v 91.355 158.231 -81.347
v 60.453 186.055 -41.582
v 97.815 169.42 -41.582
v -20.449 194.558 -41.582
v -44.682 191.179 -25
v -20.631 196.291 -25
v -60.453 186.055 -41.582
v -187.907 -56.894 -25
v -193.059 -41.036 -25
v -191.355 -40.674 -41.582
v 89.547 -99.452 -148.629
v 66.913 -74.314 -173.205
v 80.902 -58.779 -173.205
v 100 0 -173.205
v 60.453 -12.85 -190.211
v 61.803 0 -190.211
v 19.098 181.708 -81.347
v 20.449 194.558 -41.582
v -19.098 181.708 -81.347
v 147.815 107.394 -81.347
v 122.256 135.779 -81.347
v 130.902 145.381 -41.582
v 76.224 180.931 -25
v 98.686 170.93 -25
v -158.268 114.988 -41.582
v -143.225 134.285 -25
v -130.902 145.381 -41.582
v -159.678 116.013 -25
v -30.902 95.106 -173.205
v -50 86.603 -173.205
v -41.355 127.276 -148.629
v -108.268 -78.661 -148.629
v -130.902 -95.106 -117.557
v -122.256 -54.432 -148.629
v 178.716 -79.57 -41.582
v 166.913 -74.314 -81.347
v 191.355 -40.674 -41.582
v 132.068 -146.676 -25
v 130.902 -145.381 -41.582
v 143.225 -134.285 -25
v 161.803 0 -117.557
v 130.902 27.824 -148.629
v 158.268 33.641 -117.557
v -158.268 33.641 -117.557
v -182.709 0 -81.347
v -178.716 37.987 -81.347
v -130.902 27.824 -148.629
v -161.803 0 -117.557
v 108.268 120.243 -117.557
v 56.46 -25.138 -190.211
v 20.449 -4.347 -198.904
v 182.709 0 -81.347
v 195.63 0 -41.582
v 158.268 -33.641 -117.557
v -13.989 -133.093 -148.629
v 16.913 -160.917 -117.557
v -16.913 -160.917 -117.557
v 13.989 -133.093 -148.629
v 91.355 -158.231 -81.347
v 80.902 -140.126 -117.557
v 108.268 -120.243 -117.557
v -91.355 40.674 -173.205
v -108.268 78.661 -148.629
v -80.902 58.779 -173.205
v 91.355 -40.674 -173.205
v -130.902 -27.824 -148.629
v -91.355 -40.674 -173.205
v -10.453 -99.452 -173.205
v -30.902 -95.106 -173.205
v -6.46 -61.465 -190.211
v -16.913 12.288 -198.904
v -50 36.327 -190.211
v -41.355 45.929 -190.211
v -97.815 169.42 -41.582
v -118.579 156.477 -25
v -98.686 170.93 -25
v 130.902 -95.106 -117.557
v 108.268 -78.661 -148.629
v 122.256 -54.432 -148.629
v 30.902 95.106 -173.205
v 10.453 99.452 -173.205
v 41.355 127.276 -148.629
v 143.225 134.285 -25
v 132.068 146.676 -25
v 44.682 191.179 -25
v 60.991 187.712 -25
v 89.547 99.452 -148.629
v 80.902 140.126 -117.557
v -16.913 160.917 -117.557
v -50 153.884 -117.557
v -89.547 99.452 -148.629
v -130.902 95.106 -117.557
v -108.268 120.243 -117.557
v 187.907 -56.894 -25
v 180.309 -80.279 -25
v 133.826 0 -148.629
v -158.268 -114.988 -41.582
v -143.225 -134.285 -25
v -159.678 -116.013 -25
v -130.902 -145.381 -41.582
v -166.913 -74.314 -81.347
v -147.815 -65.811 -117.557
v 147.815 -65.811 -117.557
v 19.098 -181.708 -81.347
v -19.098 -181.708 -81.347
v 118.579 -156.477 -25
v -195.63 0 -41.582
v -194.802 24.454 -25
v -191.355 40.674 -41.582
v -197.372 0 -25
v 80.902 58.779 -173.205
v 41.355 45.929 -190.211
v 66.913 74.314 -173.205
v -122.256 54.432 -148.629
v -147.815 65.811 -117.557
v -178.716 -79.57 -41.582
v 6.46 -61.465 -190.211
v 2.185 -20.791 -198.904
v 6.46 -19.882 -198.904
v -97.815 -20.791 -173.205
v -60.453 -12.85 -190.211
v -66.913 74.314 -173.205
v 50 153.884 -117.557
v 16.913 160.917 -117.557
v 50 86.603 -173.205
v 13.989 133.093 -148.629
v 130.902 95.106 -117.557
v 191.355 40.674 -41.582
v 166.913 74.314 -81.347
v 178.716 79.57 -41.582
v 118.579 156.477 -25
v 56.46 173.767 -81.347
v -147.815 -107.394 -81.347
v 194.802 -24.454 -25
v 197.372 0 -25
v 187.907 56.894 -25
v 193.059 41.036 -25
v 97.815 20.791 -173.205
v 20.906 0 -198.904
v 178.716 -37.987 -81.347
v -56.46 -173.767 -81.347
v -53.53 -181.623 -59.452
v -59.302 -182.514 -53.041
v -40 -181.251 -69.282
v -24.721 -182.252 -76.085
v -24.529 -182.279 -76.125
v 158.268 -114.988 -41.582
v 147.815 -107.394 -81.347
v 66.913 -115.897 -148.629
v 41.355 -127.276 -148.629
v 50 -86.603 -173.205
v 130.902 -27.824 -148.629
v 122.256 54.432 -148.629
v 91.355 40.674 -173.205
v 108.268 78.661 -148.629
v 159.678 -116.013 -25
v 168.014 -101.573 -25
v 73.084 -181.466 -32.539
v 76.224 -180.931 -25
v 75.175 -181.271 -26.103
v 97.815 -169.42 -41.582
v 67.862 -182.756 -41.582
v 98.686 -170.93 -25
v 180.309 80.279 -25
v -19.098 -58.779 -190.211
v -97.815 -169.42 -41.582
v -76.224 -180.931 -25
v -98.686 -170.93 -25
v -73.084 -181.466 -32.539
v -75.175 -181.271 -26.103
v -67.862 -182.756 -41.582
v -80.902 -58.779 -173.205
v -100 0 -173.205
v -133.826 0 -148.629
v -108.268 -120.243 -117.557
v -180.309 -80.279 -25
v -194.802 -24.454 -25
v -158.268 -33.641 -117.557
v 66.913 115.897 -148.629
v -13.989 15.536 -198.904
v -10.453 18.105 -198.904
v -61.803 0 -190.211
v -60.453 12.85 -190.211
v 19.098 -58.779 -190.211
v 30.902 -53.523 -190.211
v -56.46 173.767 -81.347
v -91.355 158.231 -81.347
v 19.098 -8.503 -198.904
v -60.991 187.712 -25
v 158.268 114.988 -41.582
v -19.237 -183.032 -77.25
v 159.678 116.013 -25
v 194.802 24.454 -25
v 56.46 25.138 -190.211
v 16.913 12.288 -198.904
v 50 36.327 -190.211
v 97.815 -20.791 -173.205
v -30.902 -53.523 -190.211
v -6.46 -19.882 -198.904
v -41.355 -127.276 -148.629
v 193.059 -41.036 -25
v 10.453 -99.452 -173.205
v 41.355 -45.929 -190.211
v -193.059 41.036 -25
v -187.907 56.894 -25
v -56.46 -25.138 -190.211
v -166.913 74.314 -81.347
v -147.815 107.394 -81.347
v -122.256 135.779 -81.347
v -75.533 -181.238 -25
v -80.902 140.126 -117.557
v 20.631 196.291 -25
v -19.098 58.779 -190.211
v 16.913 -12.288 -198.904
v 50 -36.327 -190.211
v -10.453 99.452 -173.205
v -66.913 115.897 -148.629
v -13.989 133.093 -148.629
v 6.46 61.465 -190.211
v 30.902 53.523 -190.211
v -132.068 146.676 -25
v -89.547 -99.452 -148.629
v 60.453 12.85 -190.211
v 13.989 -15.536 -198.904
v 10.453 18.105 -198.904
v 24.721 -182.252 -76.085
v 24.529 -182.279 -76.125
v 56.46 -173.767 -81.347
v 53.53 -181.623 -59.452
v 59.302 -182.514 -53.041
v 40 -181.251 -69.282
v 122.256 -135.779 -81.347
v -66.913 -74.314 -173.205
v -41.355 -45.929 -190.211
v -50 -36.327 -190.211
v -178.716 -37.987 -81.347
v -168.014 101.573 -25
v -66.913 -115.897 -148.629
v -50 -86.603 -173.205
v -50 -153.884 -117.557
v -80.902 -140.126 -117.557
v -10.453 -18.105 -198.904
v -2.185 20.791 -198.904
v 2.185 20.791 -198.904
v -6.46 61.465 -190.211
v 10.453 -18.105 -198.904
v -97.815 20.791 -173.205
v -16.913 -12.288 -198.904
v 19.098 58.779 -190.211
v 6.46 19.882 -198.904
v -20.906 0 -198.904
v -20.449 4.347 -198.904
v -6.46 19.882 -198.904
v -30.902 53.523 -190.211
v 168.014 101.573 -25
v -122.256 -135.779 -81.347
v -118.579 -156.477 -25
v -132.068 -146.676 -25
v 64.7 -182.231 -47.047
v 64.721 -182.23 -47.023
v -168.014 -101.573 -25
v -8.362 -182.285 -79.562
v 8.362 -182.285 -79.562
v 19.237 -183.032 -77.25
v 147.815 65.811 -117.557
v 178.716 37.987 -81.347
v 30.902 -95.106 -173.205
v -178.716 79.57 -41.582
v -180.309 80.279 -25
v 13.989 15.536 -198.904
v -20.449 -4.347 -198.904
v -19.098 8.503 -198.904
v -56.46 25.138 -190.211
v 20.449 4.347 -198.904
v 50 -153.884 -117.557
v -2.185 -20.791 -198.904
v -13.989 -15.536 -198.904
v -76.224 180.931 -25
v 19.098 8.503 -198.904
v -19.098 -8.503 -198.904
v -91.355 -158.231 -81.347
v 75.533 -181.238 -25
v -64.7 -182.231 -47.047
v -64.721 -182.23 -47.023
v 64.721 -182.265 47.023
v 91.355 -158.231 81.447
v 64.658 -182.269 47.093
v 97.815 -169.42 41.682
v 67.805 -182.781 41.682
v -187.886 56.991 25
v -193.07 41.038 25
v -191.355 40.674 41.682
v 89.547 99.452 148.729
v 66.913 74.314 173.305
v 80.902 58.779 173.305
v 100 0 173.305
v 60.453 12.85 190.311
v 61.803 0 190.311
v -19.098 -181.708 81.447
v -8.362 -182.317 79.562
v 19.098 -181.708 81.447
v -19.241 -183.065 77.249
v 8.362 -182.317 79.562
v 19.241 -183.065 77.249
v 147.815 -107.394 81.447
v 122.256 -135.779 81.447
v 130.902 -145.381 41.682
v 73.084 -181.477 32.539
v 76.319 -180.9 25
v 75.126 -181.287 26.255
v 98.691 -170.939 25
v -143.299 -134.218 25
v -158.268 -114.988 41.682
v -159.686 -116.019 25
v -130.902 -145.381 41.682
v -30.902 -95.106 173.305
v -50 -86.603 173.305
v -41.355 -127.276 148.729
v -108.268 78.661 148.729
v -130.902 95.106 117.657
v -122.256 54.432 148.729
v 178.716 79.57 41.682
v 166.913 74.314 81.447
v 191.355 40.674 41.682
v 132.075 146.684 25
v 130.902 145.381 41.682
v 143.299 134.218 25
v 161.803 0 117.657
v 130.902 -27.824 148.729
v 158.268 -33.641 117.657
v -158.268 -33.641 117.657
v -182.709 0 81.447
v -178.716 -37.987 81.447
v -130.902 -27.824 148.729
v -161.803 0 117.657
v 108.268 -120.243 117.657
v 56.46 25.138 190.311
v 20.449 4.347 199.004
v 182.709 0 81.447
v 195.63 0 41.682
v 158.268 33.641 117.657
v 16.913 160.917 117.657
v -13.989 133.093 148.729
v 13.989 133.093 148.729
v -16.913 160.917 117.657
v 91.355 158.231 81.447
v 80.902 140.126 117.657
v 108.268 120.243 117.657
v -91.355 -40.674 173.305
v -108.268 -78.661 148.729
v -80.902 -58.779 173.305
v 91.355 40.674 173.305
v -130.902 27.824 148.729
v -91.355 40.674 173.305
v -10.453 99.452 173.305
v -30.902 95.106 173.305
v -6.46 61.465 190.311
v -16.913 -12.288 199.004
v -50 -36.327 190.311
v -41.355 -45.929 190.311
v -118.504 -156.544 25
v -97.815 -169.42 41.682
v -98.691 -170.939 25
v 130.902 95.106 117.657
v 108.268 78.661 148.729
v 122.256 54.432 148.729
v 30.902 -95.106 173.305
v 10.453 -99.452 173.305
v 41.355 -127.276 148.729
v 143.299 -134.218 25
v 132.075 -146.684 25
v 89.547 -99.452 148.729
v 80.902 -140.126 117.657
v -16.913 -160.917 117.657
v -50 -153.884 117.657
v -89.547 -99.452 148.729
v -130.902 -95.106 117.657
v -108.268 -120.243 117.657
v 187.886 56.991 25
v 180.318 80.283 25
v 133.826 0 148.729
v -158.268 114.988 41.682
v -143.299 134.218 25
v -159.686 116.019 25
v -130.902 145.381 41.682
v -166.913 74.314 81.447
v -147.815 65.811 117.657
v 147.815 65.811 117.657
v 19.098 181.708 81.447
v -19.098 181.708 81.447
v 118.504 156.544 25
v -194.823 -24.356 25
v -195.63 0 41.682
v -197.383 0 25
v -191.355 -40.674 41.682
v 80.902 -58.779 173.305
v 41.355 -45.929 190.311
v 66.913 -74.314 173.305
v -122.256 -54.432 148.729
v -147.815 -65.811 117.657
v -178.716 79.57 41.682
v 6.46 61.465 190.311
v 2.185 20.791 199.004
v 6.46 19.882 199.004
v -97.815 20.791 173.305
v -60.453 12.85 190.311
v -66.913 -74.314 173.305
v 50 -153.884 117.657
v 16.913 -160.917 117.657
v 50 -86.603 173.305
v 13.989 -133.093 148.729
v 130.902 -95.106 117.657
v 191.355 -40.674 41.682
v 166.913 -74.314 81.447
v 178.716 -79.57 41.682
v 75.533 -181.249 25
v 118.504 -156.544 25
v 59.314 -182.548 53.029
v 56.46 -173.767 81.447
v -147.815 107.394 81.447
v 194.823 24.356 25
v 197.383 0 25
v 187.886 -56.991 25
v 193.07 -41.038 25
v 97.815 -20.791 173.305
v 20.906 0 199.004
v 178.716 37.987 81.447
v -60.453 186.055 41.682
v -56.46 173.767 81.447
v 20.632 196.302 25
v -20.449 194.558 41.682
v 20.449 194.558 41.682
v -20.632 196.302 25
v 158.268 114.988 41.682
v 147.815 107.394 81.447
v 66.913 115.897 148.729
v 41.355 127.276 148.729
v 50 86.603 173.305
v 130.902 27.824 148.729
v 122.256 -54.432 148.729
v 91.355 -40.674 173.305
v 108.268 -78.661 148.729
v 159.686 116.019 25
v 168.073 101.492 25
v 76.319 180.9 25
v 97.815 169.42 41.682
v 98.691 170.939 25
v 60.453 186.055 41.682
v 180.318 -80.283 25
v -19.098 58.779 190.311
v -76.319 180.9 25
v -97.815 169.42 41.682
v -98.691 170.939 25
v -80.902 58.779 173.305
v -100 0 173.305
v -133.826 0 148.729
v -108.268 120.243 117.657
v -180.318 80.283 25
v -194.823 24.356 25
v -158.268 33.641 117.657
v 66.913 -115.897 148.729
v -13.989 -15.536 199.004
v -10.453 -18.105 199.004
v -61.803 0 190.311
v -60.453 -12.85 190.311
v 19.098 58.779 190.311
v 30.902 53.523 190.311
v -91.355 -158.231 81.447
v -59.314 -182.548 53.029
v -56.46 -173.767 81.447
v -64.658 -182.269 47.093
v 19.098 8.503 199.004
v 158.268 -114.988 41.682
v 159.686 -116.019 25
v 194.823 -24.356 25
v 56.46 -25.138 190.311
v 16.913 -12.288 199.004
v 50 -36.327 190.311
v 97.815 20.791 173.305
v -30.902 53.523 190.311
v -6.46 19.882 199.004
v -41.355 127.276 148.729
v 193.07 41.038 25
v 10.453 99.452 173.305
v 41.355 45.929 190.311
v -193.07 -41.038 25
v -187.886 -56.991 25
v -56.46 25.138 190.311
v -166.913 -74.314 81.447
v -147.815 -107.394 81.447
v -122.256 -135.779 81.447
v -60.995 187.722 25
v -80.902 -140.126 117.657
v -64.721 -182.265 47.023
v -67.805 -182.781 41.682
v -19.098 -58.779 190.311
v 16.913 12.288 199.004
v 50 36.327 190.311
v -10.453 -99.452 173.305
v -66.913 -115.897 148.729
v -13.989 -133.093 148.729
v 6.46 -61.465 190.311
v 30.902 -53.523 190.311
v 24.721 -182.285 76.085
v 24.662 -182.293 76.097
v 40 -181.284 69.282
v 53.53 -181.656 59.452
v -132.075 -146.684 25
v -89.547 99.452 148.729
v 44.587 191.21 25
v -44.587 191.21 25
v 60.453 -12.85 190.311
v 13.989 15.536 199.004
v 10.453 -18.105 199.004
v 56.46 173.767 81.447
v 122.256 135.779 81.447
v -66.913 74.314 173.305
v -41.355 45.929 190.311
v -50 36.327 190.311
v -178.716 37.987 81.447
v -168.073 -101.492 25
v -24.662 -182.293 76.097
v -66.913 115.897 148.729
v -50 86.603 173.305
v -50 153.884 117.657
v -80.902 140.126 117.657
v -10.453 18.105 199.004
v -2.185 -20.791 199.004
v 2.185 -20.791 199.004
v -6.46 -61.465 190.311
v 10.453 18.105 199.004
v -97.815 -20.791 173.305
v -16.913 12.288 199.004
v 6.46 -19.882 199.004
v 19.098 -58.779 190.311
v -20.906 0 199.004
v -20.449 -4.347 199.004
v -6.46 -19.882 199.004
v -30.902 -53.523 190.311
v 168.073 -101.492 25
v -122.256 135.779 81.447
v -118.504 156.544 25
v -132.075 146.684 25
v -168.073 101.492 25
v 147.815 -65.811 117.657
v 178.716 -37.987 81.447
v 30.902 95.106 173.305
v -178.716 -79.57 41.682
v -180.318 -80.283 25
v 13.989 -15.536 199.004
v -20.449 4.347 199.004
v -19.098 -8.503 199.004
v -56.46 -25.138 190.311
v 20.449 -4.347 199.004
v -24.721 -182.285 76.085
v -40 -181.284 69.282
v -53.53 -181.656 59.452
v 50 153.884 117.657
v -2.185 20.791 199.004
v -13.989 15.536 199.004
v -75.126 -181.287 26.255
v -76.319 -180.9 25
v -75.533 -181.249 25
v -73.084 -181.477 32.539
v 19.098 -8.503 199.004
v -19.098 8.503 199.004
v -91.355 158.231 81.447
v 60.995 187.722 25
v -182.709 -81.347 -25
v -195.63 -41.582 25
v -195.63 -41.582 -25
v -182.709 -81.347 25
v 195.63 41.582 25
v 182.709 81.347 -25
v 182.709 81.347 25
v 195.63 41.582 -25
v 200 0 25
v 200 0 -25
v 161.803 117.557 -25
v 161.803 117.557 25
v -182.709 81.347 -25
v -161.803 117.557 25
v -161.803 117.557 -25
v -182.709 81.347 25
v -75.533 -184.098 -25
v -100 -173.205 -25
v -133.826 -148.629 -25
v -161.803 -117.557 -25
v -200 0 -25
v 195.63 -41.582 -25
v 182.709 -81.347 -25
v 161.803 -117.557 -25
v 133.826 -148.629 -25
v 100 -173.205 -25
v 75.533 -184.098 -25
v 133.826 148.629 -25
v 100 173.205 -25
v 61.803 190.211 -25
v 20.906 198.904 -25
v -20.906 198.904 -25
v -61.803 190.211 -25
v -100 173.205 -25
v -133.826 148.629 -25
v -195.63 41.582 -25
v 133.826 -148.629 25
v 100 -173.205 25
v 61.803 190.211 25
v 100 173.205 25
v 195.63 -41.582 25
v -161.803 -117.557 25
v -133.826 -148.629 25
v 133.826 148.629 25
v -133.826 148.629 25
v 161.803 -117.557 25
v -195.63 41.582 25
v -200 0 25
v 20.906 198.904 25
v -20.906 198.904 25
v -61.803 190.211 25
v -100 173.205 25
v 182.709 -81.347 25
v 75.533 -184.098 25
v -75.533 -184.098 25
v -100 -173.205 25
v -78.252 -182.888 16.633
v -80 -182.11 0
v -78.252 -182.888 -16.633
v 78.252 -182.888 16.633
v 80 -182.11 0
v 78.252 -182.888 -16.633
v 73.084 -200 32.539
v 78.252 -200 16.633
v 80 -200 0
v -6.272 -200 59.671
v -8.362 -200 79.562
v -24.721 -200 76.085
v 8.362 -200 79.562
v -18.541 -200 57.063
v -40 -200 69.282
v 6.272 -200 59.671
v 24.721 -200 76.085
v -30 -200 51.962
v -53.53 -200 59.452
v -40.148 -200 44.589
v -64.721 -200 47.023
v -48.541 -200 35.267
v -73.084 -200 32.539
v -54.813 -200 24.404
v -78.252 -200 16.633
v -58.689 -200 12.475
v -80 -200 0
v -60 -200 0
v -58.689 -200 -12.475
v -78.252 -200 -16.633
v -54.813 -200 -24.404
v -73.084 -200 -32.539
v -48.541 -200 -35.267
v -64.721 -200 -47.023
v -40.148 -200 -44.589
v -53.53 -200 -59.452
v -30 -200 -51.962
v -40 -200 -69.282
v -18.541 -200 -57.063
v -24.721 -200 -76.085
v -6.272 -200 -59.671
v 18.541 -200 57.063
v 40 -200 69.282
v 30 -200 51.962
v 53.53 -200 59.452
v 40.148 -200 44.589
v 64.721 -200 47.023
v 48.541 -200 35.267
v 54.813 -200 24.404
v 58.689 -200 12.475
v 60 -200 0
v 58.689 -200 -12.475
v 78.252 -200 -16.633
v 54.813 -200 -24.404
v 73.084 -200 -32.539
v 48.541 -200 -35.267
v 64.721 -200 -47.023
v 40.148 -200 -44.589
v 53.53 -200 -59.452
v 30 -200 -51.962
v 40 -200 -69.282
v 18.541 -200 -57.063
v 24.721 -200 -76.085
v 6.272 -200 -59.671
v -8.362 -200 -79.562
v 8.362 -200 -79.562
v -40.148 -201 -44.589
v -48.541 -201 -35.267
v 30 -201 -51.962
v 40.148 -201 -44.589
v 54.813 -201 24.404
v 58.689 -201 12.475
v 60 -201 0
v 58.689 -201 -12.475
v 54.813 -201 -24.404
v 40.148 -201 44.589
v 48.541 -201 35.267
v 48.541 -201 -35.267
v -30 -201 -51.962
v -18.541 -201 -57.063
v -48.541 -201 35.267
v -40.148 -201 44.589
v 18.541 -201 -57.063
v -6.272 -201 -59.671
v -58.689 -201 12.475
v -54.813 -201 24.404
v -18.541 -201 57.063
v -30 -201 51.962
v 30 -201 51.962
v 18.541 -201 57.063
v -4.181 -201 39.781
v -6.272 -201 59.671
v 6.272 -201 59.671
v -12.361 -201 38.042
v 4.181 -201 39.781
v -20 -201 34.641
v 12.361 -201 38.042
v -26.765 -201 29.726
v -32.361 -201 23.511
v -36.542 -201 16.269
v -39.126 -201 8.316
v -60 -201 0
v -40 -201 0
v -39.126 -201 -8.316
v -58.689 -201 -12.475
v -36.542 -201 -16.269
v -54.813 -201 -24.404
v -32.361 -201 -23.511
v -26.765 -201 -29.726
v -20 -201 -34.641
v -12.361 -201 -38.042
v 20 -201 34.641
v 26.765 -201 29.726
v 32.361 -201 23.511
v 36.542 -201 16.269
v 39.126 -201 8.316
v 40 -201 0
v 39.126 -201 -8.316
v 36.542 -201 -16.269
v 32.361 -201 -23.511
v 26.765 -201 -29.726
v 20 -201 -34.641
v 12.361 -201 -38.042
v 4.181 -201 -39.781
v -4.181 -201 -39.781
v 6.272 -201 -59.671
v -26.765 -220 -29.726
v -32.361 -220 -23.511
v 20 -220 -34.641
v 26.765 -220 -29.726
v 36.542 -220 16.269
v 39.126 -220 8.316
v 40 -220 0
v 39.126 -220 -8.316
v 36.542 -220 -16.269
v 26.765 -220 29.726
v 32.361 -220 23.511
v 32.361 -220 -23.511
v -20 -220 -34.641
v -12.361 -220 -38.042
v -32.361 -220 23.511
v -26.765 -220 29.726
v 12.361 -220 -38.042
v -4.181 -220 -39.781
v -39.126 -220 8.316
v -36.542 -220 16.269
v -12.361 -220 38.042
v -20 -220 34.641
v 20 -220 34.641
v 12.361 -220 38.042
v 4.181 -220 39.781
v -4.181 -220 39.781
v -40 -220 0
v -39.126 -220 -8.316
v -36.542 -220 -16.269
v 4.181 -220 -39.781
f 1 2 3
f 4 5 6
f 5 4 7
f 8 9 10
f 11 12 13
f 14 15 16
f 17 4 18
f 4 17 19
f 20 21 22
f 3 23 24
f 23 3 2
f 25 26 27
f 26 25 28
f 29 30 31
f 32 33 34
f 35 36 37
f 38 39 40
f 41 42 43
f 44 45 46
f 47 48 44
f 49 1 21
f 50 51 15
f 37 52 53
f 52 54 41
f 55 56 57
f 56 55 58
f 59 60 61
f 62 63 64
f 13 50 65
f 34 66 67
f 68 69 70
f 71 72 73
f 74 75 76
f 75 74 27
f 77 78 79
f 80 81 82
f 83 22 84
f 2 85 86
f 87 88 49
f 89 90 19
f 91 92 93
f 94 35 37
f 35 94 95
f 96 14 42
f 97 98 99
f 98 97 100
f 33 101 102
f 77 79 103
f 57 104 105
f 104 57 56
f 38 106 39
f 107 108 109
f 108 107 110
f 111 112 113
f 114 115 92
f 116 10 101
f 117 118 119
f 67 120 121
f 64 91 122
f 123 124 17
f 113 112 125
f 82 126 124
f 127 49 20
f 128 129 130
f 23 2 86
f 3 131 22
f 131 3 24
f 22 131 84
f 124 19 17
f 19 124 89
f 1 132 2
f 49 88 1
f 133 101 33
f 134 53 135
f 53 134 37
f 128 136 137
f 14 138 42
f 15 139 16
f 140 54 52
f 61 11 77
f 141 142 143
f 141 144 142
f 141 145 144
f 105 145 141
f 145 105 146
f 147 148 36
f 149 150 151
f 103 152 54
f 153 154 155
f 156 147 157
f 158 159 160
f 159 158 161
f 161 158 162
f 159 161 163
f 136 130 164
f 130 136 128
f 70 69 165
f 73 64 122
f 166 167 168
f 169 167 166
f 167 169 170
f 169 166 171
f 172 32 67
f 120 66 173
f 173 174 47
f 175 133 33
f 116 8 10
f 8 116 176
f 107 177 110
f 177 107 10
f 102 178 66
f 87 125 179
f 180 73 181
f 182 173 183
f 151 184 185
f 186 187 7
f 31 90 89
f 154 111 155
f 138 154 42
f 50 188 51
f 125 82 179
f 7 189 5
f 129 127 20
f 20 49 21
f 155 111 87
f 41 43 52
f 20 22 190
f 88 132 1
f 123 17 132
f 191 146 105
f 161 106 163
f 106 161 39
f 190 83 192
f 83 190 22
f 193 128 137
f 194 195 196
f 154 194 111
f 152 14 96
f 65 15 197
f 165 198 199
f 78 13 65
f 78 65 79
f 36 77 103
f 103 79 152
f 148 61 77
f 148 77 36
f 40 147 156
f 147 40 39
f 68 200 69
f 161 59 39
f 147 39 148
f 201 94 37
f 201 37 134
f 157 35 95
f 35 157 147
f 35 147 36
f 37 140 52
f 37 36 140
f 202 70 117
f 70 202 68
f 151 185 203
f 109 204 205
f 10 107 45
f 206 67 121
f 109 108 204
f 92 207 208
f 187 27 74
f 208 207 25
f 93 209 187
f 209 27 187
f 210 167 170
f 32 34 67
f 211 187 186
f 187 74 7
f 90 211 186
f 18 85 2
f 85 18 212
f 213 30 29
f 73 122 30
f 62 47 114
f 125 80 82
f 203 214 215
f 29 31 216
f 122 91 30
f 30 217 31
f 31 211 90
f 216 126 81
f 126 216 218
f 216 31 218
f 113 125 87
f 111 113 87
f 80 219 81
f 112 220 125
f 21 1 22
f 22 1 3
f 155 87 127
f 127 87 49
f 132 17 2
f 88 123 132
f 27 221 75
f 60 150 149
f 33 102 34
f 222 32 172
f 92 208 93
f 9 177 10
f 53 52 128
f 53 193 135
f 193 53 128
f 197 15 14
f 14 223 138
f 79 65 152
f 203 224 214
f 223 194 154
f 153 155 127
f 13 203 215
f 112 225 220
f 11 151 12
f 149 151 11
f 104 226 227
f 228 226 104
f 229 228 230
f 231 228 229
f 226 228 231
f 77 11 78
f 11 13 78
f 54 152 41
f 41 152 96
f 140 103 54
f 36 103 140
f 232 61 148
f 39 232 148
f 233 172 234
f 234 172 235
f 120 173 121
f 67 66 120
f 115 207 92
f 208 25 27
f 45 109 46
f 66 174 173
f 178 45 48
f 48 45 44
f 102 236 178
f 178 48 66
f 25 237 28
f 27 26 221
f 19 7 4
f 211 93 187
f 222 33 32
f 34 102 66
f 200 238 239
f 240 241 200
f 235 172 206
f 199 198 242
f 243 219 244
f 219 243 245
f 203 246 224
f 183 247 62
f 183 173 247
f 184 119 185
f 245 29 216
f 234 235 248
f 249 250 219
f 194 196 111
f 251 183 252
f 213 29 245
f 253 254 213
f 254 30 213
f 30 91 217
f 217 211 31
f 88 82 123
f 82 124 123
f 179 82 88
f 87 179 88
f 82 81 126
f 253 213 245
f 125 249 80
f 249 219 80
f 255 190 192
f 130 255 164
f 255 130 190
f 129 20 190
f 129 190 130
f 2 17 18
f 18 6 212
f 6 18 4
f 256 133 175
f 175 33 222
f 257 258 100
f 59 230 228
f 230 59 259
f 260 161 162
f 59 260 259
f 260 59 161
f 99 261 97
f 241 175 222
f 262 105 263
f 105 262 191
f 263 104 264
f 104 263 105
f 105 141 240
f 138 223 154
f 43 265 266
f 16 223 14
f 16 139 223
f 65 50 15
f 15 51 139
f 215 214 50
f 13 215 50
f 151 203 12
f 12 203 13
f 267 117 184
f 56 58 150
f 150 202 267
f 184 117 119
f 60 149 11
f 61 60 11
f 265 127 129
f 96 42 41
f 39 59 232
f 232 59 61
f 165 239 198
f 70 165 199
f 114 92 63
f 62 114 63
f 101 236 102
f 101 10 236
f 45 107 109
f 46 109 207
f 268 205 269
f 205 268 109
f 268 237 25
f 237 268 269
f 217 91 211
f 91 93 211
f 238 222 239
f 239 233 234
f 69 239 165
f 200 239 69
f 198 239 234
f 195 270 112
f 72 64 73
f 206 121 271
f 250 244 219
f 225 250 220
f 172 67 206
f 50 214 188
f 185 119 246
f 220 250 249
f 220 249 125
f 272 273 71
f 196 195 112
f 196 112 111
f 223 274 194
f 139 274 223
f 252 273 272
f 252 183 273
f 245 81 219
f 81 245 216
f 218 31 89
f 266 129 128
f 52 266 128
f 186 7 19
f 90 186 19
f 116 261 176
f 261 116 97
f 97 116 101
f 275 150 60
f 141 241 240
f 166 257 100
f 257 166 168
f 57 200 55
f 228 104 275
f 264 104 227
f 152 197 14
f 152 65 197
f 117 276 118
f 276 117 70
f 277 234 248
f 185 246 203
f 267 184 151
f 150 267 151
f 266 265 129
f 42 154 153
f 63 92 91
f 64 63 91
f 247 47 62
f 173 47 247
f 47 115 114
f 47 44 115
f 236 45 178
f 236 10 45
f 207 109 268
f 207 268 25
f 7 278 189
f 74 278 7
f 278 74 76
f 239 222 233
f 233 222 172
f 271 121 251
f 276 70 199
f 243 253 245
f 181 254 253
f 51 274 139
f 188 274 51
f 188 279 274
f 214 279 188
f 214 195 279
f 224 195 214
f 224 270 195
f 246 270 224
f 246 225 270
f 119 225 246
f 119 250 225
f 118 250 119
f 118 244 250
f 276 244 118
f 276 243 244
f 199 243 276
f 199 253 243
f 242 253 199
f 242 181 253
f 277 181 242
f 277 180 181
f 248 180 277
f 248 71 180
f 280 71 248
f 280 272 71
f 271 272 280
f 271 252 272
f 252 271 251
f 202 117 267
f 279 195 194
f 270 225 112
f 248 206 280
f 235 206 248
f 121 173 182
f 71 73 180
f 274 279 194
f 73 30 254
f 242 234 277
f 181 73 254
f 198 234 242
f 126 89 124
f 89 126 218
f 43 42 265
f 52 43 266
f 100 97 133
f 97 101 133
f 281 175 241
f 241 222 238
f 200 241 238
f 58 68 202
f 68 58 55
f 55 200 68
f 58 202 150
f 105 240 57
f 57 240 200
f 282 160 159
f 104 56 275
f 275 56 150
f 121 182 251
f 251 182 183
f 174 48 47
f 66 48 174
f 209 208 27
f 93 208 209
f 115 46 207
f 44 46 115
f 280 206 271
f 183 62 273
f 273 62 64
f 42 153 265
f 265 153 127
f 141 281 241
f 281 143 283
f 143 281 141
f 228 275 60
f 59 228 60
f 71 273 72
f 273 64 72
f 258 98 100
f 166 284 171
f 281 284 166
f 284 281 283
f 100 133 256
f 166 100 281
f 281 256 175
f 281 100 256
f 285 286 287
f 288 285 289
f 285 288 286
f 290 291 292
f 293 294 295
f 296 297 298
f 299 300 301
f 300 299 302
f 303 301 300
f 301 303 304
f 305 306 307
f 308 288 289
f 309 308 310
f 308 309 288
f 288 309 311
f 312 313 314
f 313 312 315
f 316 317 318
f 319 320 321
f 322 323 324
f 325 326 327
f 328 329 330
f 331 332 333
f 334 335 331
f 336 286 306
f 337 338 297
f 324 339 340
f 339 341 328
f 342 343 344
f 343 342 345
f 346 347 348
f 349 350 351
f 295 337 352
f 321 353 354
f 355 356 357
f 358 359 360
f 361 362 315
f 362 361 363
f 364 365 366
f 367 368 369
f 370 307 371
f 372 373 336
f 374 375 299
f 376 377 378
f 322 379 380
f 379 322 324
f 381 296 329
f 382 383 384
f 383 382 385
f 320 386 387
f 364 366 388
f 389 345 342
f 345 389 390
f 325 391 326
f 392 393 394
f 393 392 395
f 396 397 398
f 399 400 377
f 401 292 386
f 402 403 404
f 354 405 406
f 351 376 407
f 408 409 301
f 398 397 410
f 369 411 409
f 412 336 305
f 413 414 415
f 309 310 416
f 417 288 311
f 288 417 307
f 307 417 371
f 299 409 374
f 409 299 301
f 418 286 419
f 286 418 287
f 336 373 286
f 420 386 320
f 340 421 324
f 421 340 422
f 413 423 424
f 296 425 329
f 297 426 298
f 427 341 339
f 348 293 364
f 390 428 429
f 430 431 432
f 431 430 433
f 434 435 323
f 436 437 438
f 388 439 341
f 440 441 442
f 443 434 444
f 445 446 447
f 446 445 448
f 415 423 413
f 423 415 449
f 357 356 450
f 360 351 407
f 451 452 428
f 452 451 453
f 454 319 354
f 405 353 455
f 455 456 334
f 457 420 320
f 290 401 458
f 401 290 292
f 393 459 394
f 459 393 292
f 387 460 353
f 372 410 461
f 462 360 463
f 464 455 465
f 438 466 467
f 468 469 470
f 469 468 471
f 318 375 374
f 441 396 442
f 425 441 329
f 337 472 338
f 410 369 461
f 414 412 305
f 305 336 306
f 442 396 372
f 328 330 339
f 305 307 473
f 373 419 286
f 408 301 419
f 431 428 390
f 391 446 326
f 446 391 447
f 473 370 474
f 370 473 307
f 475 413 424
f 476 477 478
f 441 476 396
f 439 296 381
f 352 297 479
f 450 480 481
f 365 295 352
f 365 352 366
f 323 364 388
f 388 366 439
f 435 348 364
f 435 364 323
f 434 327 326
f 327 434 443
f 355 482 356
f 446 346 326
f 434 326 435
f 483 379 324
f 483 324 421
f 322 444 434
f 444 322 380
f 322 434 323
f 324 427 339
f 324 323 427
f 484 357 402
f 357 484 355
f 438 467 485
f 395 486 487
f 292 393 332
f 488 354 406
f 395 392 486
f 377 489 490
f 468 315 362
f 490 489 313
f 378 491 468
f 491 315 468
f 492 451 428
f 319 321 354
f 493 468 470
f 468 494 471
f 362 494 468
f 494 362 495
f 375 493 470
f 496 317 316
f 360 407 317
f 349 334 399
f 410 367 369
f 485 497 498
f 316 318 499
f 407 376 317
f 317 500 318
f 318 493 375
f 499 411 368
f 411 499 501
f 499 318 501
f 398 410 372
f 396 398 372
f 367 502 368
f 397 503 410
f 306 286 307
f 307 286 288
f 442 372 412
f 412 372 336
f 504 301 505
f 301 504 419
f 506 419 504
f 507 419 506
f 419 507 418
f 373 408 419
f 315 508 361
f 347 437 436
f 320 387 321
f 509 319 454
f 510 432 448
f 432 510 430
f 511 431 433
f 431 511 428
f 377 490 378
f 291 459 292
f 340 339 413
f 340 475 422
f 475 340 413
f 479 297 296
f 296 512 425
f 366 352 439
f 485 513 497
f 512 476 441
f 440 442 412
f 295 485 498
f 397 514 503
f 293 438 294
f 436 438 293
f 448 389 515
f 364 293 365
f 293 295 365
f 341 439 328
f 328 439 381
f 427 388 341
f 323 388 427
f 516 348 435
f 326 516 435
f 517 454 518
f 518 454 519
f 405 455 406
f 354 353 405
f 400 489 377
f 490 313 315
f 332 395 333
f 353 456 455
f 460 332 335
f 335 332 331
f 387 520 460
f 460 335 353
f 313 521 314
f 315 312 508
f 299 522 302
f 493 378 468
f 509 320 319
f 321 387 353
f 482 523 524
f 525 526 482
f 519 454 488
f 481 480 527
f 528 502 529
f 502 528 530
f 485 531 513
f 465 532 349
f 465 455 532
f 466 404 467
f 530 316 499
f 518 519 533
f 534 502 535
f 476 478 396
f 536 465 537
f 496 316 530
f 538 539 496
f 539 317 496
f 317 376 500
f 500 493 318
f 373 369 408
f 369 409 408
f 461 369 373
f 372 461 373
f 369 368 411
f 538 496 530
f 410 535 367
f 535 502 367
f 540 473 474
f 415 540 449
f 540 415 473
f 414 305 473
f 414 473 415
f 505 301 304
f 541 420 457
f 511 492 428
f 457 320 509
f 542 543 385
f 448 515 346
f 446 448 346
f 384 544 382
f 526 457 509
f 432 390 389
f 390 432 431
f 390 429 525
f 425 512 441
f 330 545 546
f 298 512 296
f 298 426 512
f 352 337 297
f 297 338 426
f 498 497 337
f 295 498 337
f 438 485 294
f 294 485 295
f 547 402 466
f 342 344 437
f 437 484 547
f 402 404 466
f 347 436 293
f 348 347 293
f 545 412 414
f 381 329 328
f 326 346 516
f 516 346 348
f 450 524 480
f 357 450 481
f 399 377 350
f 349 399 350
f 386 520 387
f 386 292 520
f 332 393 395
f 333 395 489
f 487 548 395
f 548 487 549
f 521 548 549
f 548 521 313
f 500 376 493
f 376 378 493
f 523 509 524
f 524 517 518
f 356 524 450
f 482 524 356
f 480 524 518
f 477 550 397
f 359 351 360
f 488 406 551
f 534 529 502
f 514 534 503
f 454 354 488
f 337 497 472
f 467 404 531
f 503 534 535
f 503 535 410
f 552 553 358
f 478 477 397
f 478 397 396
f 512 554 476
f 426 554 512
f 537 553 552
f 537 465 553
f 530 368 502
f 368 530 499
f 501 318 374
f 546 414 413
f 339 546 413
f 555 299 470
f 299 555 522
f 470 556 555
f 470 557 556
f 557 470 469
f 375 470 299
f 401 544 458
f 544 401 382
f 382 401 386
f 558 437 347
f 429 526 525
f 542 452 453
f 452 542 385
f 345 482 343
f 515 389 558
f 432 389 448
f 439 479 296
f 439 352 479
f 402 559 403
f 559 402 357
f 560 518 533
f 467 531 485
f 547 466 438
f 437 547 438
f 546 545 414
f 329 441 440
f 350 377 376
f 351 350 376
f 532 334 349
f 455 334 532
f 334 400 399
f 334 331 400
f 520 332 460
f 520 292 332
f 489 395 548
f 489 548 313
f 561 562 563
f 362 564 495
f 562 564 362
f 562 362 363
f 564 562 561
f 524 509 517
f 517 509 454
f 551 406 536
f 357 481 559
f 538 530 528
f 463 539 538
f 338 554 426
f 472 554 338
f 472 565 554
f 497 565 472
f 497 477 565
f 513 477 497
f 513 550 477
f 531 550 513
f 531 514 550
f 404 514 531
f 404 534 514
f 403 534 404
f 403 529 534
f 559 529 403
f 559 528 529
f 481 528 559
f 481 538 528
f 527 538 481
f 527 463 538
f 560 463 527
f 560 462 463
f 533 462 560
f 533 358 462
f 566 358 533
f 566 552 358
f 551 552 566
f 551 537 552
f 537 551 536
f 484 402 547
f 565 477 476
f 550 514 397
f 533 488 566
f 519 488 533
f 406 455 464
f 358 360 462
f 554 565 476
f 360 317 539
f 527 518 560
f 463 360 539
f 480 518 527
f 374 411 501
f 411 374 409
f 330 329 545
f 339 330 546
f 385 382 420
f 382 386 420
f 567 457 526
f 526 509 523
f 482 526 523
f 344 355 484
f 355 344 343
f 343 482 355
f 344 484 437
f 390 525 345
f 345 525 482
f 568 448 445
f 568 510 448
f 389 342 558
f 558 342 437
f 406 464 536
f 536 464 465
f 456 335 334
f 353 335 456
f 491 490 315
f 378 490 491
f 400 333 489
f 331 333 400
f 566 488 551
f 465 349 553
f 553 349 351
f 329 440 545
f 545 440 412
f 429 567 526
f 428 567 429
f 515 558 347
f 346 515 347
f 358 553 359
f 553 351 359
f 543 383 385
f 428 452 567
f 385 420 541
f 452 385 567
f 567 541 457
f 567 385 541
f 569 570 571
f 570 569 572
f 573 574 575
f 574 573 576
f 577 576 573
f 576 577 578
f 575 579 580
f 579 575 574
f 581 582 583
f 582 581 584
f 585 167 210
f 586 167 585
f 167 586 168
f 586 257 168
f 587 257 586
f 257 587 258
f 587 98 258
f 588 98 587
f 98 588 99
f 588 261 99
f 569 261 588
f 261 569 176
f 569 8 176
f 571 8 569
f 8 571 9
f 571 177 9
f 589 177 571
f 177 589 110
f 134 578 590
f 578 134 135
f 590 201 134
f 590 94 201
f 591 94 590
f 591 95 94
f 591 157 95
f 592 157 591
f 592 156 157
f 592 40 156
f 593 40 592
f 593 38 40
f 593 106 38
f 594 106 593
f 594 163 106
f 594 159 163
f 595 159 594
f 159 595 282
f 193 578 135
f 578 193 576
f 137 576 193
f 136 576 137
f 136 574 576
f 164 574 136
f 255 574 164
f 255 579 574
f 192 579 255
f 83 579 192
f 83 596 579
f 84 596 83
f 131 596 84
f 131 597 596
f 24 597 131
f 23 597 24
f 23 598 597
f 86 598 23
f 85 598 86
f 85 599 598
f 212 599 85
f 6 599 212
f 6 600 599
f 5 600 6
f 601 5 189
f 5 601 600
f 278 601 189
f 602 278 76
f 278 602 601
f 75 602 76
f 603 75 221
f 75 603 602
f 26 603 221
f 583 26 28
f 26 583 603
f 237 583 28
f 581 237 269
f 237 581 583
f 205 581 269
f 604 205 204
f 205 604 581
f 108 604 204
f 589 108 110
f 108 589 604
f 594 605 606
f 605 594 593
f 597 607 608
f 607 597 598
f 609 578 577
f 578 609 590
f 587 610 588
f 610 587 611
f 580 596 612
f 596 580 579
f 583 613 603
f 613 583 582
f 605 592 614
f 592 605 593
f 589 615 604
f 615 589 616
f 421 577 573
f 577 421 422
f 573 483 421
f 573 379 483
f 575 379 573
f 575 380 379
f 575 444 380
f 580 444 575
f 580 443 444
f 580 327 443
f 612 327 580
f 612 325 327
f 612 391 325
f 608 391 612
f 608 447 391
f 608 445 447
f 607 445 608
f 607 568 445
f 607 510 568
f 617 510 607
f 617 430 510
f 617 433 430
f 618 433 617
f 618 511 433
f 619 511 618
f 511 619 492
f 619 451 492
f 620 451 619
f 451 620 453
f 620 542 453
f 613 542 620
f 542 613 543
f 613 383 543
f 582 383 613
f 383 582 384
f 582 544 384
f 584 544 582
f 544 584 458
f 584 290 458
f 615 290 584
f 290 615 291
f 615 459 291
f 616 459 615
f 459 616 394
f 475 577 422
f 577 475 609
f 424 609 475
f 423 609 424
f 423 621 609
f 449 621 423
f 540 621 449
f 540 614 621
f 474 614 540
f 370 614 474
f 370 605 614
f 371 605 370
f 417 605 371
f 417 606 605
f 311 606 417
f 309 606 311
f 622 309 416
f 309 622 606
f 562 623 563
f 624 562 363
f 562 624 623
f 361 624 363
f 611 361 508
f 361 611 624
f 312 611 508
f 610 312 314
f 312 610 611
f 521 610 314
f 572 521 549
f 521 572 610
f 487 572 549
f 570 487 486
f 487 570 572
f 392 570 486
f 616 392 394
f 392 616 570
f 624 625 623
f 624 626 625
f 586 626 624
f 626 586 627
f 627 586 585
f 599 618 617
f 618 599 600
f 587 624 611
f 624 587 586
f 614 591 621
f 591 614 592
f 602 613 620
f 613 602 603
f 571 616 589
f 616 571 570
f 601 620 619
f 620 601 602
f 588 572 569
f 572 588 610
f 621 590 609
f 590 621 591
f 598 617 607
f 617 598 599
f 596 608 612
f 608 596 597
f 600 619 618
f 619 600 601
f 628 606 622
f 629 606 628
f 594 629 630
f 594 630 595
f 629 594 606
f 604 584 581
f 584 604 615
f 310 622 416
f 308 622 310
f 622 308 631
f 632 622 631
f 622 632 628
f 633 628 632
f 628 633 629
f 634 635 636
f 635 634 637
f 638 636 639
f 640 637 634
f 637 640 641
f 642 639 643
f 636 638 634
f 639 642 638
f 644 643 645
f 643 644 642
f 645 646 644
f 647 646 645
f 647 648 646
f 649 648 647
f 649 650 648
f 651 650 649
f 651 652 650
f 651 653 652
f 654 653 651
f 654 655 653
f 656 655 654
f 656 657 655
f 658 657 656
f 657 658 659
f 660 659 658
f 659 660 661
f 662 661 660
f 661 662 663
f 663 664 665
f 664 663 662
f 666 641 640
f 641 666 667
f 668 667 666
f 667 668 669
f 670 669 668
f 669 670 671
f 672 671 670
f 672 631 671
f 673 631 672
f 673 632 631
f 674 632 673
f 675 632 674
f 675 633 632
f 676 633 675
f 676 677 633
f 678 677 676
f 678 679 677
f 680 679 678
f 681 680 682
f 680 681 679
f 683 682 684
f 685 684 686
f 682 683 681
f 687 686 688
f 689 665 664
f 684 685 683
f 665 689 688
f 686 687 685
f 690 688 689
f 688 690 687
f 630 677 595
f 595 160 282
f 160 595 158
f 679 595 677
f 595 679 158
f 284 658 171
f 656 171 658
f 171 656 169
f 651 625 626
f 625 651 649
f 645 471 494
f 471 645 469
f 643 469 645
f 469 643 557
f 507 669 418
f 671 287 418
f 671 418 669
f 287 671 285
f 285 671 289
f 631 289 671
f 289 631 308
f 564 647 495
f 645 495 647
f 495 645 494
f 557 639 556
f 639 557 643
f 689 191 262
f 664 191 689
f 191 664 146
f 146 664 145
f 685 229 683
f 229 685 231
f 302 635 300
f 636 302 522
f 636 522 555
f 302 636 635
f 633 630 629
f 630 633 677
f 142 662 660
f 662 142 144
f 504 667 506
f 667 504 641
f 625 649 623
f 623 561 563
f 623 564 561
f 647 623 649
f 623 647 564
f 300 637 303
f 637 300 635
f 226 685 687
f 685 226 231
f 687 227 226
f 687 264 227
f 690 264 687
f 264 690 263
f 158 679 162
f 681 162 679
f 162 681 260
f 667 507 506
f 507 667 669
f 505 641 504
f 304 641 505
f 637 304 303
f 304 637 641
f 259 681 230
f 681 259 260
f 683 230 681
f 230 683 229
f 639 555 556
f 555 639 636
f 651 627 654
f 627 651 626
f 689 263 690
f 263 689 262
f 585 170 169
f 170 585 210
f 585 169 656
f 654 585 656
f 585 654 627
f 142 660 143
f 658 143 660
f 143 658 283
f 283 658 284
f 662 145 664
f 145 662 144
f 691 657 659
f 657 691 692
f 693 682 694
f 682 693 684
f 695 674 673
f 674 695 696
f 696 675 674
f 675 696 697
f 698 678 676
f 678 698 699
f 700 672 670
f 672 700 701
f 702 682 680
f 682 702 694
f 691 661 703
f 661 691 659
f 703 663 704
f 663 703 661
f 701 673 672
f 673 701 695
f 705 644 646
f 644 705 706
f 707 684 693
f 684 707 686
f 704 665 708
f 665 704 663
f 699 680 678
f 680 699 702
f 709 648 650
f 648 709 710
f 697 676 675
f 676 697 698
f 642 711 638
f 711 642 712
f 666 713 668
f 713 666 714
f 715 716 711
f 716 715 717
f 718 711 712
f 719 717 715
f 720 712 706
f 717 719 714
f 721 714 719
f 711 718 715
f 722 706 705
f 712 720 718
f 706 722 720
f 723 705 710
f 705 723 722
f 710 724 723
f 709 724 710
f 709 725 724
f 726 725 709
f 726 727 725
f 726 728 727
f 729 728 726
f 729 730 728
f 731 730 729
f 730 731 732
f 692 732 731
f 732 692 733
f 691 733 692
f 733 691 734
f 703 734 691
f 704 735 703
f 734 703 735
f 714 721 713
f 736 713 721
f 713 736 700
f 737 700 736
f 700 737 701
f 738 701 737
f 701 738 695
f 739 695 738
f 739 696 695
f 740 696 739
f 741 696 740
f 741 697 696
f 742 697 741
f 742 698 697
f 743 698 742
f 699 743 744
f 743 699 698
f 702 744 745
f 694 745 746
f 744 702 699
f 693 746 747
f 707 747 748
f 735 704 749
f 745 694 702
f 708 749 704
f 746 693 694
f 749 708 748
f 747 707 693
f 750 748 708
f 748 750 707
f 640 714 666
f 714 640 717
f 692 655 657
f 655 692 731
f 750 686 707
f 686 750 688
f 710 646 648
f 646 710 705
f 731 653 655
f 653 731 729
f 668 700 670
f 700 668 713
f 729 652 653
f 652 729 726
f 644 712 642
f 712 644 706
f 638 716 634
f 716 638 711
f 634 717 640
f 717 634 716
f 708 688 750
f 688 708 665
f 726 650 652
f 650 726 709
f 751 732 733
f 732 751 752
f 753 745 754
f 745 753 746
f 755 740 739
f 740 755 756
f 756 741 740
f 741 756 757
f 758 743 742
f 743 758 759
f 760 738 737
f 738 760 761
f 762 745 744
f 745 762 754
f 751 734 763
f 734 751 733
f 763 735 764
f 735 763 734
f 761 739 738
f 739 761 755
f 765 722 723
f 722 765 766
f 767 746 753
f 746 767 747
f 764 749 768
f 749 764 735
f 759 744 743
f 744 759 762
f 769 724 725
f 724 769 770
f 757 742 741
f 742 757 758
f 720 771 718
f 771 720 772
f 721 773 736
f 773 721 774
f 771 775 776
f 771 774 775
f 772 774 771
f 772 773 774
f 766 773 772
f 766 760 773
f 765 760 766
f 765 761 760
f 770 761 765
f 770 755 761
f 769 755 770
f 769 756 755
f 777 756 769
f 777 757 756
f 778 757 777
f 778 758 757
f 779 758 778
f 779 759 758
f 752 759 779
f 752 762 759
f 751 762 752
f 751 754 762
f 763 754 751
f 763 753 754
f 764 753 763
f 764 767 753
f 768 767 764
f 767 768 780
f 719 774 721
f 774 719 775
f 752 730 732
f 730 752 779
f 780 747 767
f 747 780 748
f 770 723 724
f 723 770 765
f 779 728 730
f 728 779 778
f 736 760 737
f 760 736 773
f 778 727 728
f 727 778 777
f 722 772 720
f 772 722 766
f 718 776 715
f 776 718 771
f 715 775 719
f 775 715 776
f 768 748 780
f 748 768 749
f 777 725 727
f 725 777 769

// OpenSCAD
//南半球颜色
CoverColor="red";
//北半球颜色
BottomColor="white";
//中环颜色
RingColor="Black";
//球半径
ball_r=200;
//按钮半径
button_r=ball_r/5;
button_height=ball_r/10;
//半球模型
module halfball(r)
{
	difference()
		{
			sphere(r=r,center=true);
			translate([0,0,r])cube([r*2,r*2,r*2],center=true);
		}
}

union()
{
	//南半球
	color(BottomColor) halfball(ball_r);
	//北半球
	color(CoverColor)	translate([0,0,0.1]) rotate([180,0,0])halfball(ball_r);
	//黑环 两个方案 二选一
	//color(RingColor) translate([0,0,-(ball_r/8)]) rotate_extrude(angle=360, convexity = 0) square([ball_r+3,(ball_r/4)]);
	color(RingColor) translate([0,0,0]) cylinder(h=ball_r/4,r=ball_r,center=true);
	//按钮黑边
	color(RingColor) translate([0,0,0]) rotate([90,0,0]) cylinder(h=ball_r,r=button_r*2,center=false);
	//按钮白边
	color(BottomColor) translate([0,0,0]) rotate([90,0,0]) cylinder(h=ball_r+1,r=button_r*1.5,center=false);
	//按钮
	color(BottomColor) translate([0,0,0]) rotate([90,0,0]) cylinder(h=ball_r+button_height,r=button_r,center=false);
}
